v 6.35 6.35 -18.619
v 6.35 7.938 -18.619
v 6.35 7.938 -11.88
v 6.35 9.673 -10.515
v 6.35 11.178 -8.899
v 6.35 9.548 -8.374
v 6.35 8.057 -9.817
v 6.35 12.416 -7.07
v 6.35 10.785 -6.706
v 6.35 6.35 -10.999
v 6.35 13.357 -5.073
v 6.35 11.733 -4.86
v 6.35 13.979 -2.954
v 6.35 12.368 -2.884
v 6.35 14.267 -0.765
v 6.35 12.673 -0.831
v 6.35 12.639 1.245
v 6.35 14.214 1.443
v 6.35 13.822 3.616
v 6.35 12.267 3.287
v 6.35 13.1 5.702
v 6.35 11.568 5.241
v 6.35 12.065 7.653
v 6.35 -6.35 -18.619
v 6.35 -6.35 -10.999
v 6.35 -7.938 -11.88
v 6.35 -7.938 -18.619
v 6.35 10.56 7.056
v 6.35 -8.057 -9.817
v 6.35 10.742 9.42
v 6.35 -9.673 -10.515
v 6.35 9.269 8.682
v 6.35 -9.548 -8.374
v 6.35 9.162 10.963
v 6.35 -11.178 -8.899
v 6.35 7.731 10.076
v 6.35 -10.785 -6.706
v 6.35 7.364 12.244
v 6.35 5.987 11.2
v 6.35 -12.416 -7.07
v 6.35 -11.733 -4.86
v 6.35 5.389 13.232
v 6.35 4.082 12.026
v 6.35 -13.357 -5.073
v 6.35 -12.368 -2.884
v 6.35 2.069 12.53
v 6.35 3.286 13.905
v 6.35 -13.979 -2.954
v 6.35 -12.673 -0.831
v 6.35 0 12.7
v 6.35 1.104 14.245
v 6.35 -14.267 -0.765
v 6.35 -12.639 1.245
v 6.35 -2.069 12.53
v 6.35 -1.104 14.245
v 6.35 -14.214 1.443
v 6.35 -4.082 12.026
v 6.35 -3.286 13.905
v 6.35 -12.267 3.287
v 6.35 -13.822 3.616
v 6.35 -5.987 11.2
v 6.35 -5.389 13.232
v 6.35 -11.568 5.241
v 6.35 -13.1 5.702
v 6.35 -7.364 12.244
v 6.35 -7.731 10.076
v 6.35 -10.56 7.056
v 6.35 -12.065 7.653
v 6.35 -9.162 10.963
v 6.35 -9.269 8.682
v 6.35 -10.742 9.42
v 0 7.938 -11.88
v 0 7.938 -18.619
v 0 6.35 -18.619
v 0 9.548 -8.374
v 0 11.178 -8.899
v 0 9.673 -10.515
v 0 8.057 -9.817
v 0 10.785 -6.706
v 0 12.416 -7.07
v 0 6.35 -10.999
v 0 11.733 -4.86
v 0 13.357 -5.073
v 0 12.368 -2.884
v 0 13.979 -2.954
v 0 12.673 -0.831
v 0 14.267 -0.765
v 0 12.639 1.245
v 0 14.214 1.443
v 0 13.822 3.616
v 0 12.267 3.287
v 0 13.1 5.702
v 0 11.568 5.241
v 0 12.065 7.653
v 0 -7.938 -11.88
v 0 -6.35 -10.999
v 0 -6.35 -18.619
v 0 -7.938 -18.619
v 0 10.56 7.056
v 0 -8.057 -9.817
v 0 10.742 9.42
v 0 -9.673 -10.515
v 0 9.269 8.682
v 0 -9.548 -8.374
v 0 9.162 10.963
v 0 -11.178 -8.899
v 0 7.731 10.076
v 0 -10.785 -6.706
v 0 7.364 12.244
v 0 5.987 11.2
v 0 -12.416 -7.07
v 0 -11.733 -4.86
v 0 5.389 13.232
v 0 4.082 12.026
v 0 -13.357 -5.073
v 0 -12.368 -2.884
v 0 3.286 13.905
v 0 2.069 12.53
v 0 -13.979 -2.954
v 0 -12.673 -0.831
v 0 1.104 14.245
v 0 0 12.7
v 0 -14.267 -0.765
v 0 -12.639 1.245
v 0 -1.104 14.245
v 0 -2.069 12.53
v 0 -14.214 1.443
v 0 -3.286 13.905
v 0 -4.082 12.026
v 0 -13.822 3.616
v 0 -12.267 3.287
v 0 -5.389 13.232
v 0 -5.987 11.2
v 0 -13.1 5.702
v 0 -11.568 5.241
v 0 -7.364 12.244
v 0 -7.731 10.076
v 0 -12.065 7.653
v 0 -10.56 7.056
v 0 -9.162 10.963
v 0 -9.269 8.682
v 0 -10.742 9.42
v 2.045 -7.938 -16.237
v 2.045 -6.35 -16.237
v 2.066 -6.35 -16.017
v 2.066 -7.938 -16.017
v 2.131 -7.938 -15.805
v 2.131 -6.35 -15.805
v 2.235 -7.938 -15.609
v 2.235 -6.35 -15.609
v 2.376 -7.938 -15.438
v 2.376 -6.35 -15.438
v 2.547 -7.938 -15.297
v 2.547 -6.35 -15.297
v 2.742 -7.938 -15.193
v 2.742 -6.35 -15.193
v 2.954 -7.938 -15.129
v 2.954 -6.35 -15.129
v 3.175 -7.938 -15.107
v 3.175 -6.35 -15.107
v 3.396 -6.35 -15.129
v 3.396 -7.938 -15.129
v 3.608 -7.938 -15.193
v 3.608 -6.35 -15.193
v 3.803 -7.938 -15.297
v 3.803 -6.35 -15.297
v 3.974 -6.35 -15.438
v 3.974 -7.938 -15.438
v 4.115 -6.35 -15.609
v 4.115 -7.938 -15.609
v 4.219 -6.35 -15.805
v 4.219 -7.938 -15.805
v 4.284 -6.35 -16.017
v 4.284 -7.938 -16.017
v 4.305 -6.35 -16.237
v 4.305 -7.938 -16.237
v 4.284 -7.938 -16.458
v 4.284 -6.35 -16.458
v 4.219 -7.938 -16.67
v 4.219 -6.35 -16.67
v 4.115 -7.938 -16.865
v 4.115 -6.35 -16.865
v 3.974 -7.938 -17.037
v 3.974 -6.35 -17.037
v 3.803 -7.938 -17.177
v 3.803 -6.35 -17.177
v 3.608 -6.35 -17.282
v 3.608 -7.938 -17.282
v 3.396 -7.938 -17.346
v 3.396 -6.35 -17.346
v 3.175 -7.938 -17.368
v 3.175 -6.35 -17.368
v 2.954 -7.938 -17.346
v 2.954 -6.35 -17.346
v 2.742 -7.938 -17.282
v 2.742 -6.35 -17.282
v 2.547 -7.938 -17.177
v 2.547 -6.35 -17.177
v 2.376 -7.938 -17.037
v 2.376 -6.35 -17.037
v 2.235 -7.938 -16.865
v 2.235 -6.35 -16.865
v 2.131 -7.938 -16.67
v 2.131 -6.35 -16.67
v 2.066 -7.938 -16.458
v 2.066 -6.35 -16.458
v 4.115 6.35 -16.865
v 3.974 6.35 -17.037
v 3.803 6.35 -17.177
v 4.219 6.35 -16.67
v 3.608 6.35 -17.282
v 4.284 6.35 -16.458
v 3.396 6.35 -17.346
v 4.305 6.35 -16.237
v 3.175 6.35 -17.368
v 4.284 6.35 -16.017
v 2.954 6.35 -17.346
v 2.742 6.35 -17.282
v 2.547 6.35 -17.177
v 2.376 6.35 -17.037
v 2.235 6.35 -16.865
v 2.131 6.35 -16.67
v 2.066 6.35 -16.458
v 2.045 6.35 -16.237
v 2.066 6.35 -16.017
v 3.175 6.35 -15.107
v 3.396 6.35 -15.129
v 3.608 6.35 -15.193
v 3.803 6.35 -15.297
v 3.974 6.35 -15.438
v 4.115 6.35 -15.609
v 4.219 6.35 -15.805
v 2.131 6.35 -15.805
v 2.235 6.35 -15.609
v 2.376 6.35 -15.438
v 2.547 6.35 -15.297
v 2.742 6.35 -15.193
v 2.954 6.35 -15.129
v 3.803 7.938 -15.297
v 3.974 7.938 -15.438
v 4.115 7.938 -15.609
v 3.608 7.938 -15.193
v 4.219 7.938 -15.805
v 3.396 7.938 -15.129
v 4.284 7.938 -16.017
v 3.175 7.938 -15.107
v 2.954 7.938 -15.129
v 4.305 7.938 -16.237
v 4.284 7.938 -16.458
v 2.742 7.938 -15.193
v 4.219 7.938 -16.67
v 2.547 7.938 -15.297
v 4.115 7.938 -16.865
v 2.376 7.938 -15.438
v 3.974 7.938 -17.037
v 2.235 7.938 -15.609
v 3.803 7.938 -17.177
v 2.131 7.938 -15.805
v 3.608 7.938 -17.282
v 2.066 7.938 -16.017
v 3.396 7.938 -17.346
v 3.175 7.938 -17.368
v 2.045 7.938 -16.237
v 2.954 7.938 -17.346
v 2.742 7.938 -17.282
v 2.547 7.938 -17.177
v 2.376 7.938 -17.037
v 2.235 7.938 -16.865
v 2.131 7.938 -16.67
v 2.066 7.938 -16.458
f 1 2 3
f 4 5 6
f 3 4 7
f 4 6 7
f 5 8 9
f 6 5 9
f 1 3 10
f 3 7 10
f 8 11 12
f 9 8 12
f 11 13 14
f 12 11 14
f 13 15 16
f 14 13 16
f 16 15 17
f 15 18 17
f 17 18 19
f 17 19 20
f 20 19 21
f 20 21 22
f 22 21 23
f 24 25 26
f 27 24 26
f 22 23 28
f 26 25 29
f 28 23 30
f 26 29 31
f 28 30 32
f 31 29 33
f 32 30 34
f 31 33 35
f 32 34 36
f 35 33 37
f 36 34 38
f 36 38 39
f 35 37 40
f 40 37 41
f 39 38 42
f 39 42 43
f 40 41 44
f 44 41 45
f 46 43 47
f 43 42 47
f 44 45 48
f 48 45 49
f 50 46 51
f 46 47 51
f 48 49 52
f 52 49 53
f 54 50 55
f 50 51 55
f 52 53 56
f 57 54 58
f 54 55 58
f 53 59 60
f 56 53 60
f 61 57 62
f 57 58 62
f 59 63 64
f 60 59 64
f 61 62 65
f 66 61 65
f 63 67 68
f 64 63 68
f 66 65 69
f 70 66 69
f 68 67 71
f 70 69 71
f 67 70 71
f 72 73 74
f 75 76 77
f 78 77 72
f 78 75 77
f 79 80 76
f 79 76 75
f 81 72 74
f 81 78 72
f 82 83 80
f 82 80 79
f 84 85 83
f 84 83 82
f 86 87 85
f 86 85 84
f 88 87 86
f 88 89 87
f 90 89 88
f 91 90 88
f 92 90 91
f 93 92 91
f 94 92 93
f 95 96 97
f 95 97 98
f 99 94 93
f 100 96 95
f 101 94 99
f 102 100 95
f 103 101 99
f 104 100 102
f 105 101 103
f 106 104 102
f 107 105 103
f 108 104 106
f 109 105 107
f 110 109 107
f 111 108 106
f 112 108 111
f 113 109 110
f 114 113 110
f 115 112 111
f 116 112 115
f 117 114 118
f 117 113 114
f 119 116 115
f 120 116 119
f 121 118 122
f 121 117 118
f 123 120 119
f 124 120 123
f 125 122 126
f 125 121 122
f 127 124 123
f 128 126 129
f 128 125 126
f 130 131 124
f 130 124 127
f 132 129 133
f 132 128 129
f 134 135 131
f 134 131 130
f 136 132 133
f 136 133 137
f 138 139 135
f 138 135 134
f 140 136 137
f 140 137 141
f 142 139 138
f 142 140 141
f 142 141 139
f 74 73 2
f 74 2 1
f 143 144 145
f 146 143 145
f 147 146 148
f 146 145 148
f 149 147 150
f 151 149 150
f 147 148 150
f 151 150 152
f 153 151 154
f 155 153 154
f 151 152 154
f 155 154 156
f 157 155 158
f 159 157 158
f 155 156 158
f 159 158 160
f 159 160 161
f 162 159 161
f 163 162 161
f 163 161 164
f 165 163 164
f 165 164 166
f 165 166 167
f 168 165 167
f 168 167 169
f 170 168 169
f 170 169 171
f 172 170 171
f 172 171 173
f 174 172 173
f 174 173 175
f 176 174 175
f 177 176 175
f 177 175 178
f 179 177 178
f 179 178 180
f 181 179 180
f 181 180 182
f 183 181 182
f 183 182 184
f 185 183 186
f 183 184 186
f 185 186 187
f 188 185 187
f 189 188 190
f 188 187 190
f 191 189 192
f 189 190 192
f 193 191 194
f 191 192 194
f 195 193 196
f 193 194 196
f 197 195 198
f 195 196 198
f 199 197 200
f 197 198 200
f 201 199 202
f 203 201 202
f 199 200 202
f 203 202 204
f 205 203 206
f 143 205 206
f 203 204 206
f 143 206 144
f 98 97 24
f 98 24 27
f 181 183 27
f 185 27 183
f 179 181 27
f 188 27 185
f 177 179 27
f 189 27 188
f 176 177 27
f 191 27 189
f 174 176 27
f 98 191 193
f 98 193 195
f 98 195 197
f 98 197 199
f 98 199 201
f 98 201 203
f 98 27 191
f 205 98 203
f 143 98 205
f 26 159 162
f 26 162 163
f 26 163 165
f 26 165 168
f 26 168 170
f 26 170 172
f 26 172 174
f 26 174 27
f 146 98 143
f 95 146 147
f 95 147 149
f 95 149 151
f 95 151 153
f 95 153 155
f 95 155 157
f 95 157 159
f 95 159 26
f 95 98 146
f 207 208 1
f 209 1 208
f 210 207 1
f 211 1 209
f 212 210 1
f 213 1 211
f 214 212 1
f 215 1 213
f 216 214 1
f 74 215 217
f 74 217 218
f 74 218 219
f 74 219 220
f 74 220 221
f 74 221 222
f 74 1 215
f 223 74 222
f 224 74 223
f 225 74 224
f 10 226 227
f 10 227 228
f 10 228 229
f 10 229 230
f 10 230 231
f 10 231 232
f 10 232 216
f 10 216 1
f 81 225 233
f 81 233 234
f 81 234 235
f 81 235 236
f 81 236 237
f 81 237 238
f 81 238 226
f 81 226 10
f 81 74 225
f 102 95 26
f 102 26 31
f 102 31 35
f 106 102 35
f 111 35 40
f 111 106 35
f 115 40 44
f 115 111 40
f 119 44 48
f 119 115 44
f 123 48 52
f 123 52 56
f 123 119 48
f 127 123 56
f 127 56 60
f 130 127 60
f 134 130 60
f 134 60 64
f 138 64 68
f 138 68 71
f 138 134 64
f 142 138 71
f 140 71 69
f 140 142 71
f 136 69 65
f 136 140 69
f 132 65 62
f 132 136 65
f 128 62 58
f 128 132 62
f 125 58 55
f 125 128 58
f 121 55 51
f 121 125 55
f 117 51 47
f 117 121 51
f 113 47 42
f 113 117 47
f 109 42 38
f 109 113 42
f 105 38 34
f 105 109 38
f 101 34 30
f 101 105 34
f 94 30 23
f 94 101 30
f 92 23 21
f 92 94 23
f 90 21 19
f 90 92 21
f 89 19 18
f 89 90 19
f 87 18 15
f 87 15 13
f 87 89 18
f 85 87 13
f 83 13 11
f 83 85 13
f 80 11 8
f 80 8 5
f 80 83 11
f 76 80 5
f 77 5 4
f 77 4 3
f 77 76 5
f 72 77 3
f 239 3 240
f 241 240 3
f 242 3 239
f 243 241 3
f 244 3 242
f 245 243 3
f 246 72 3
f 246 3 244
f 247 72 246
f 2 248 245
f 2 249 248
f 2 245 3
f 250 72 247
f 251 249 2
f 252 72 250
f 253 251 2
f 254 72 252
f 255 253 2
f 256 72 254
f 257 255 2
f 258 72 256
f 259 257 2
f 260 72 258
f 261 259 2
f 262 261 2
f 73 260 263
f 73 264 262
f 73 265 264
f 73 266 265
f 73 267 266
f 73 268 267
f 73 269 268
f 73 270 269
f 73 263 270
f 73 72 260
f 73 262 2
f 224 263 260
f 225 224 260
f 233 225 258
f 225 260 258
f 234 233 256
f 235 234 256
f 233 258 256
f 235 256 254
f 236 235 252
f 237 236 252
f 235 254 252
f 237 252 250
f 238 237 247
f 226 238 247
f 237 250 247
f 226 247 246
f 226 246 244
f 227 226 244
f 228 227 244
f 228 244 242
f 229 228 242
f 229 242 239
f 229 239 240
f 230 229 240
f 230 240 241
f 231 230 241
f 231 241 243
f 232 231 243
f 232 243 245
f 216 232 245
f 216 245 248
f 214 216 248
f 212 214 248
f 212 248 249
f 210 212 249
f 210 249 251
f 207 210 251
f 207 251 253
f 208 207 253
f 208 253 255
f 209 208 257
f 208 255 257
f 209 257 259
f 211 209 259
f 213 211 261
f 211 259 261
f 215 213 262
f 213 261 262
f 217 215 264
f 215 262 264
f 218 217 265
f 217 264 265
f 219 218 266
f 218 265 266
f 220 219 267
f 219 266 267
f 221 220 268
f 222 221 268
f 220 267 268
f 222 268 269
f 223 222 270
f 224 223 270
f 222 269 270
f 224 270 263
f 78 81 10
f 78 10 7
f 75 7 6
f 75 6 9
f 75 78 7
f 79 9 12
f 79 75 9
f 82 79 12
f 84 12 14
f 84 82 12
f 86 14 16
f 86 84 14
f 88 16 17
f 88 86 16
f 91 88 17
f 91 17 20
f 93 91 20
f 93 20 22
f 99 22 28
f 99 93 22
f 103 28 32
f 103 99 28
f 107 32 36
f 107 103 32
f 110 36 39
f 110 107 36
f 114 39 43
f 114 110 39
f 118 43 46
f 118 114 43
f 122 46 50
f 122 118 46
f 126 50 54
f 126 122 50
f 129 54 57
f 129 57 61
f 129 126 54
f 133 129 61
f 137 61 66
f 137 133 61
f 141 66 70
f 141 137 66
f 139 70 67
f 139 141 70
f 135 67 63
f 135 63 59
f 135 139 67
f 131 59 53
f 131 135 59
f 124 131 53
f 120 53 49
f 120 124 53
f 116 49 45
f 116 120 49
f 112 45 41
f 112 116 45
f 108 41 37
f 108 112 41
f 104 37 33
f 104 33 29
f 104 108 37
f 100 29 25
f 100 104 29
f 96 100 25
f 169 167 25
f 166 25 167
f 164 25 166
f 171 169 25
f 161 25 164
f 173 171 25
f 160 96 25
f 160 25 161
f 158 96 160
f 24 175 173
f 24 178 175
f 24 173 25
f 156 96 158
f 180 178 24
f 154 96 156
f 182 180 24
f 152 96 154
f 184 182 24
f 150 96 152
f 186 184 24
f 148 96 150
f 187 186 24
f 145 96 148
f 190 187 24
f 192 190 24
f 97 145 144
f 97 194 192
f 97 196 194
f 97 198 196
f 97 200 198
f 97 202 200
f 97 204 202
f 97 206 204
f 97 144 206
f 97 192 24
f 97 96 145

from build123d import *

# Parameters (mm, degrees)
BOSS_EXTRUDE1_DEPTH       = 6.35
TAP_DRILL_FOR_4_40_TAP1_D = 2.2606


with BuildPart() as part:
    # Sketch2 → Boss-Extrude1 (new body)
    with BuildSketch(Plane.YZ):
        with BuildLine():
            Line((-6.35, -10.998522628), (-6.35, -18.618522628))
            Line((-6.35, -18.618522628), (-7.9375, -18.618522628))
            Line((-7.9375, -18.618522628), (-7.9375, -11.879762203))
            ThreePointArc((-7.9375, -11.879762203), (0, 14.2875), (7.9375, -11.879762203))
            Line((7.9375, -11.879762203), (7.9375, -18.618522628))
            Line((7.9375, -18.618522628), (6.35, -18.618522628))
            Line((6.35, -18.618522628), (6.35, -10.998522628))
            ThreePointArc((6.35, -10.998522628), (0, 12.7), (-6.35, -10.998522628))
        make_face()
    extrude(amount=BOSS_EXTRUDE1_DEPTH)

    # Tap Drill for #4-40 Tap1 (through all)
    with Locations(Plane.XZ.offset(7.9375)):
        with Locations((3.175, -16.237272628)):
            Hole(TAP_DRILL_FOR_4_40_TAP1_D / 2)


solid = part.part
